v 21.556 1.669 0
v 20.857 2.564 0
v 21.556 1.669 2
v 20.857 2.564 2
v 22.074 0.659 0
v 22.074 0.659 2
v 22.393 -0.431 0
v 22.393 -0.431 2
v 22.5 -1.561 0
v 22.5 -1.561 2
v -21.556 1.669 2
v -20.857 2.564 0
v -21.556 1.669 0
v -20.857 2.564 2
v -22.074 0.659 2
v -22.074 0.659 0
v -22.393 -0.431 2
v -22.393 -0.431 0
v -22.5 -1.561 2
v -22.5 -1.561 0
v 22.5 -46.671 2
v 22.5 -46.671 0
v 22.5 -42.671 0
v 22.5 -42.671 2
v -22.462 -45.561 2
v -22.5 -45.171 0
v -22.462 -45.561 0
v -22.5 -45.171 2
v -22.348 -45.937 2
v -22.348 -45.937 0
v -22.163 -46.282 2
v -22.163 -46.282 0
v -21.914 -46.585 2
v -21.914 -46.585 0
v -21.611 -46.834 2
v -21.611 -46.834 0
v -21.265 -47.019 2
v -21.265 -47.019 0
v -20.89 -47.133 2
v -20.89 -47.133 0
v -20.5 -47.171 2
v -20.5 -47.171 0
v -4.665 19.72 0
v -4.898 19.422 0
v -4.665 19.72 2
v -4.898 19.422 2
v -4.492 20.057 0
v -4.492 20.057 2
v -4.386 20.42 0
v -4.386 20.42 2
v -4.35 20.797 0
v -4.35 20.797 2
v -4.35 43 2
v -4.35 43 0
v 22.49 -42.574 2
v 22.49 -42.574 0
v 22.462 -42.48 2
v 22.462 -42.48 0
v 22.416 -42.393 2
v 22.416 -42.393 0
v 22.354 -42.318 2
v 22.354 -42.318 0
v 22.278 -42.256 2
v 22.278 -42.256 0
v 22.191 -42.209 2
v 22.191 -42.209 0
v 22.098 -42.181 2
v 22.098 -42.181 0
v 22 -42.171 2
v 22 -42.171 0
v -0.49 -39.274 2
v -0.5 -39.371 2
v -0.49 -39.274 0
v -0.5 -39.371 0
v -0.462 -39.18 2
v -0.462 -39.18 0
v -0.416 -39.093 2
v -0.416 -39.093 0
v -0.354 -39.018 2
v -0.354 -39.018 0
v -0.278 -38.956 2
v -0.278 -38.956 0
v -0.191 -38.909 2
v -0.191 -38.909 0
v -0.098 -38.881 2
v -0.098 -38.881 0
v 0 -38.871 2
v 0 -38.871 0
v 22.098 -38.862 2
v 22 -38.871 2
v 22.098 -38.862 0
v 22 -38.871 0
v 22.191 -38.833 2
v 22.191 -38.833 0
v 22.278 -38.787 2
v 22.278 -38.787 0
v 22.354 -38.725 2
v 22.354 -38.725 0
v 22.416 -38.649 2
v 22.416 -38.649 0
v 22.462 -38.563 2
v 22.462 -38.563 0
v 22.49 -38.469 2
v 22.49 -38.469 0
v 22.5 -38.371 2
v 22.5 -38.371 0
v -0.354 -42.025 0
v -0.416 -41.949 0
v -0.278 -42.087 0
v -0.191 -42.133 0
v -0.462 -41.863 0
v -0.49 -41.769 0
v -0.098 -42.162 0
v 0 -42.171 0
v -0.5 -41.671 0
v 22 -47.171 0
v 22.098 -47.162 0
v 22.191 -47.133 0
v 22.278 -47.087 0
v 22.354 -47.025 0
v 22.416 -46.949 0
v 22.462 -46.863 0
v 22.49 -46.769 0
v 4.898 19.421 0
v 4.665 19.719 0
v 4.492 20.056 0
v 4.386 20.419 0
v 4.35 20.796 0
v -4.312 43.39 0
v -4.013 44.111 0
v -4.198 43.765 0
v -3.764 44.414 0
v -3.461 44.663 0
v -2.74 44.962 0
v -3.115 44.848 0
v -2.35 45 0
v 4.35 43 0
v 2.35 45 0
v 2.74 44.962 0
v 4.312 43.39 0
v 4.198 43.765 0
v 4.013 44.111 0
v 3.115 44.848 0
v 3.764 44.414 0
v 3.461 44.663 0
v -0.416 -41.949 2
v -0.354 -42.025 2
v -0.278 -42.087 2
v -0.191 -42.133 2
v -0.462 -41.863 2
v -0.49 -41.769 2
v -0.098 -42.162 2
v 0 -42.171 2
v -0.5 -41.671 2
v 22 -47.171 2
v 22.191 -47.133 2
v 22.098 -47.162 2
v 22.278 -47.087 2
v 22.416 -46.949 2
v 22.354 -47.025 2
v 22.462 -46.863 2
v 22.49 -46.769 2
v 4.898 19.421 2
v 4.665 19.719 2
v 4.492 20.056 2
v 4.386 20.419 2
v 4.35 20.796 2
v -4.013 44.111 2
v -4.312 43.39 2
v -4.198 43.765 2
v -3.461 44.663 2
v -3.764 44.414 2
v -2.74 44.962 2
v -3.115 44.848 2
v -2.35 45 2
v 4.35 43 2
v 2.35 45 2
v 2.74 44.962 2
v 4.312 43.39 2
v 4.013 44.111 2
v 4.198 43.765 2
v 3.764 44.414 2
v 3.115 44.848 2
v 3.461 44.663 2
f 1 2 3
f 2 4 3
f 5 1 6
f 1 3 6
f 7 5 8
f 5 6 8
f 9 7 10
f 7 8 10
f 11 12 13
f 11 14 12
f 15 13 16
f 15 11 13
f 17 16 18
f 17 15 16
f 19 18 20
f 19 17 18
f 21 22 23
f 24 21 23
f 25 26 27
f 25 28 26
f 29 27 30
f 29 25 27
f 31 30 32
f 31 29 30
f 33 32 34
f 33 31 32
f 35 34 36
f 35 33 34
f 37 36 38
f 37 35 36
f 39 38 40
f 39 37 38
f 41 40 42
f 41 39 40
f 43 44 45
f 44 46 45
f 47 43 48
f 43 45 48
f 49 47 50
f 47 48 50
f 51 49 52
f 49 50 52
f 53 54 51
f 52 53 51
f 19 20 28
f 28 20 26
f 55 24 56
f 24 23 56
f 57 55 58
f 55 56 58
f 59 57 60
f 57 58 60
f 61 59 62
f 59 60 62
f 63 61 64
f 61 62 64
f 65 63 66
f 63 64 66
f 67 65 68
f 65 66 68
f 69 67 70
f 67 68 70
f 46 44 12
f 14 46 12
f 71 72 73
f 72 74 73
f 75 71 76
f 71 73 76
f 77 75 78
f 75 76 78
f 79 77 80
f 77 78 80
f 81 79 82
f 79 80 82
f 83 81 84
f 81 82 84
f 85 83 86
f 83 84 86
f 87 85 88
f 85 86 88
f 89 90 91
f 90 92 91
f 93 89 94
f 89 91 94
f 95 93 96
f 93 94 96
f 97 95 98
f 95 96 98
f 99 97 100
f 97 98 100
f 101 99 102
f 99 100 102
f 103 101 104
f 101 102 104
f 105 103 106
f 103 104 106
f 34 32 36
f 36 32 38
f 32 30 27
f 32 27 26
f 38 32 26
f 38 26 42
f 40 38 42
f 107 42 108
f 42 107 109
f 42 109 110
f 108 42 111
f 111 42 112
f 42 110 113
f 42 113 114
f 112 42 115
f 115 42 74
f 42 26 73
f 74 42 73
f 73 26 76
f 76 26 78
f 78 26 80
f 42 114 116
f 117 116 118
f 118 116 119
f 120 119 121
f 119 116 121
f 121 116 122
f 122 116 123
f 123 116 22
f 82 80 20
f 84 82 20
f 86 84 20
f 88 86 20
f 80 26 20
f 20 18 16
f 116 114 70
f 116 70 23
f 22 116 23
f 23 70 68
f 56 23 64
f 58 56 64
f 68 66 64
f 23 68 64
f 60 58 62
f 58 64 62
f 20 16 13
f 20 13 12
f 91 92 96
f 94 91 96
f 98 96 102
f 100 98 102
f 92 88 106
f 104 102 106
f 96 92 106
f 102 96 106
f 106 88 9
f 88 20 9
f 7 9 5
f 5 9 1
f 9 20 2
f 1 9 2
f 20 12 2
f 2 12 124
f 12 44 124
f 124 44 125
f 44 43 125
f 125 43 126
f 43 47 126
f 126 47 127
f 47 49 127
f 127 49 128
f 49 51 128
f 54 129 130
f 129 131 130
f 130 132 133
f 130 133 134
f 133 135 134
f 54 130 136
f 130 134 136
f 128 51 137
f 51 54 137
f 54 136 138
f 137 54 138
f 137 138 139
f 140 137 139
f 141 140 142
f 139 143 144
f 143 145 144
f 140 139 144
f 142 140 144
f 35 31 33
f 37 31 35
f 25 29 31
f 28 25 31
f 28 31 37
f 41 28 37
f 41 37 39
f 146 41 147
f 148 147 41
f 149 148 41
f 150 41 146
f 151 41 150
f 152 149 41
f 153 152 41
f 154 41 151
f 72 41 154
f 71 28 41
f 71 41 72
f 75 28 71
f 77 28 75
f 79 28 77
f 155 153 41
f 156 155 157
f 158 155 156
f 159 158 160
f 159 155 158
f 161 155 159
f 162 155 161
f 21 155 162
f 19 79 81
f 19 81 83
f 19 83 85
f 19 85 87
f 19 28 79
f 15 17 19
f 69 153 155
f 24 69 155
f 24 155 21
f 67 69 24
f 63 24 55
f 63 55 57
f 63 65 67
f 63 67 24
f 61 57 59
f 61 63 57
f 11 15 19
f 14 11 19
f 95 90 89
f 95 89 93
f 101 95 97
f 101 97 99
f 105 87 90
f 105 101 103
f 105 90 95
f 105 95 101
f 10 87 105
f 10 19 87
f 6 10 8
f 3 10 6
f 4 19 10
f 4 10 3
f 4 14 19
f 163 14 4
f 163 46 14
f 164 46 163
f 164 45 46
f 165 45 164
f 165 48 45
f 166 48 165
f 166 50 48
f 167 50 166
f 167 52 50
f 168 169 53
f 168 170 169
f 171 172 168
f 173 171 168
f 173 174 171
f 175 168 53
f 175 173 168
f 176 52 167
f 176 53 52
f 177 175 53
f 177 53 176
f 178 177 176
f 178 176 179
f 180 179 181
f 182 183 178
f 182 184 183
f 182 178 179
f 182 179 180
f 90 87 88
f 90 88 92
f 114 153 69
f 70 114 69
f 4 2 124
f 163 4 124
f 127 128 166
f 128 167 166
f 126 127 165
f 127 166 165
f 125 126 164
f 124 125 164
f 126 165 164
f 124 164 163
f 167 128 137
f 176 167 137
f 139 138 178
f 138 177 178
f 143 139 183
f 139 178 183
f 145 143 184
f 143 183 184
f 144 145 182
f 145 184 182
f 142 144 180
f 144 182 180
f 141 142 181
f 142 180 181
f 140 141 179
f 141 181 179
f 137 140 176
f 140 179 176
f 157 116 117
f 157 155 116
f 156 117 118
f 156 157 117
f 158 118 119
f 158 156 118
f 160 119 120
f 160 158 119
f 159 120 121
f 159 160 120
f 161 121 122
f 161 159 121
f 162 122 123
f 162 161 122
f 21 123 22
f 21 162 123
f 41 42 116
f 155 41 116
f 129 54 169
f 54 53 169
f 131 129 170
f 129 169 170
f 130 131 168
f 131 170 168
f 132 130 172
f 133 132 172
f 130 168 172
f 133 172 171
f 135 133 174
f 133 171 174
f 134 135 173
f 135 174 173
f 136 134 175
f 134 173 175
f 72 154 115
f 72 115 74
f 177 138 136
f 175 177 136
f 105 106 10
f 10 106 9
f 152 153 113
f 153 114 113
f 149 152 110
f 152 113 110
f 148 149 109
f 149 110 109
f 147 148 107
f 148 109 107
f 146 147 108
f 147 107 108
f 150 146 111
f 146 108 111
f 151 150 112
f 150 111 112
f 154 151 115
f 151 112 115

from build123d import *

# Parameters (mm, degrees)
SALIENTE_EXTRUIR1_DEPTH = 2
CROQUIS3_W              = 23
CROQUIS3_H              = 3.3
CORTAR_EXTRUIR2_DEPTH   = 2
REDONDEO1_R             = 2
REDONDEO2_R             = 6
REDONDEO3_R             = 0.5


with BuildPart() as part:
    # Croquis1 → Saliente-Extruir1 (new body)
    with BuildSketch(Plane.XY):
        Polygon((-4.35, 20), (-22.5, 0.828732436), (-22.5, -47.171267564), (22.5, -47.171267564), (22.5, 0.828732436), (4.35, 19.999005159), (4.35, 45), (-4.35, 45), align=None)
    extrude(amount=SALIENTE_EXTRUIR1_DEPTH)

    # Croquis3 → Cortar-Extruir2 (cut)
    with BuildSketch(Plane.XY.offset(2)):
        with Locations((11, -40.521267564)):
            Rectangle(CROQUIS3_W, CROQUIS3_H)
    extrude(amount=-CORTAR_EXTRUIR2_DEPTH, mode=Mode.SUBTRACT)

    # Redondeo1
    redondeo1_edges = [part.edges().sort_by_distance(p)[0] for p in [
        (-4.35, 45, 1),
        (-4.35, 20, 1),
        (-22.5, -47.171267564, 1),
        (4.35, 19.999005159, 1),
        (4.35, 45, 1),
    ]]
    fillet(redondeo1_edges, radius=REDONDEO1_R)

    # Redondeo2
    redondeo2_edges = [part.edges().sort_by_distance(p)[0] for p in [
        (-22.5, 0.828732436, 1),
        (22.5, 0.828732436, 1),
    ]]
    fillet(redondeo2_edges, radius=REDONDEO2_R)

    # Redondeo3
    redondeo3_edges = [part.edges().sort_by_distance(p)[0] for p in [
        (22.5, -47.171267564, 1),
        (-0.5, -38.871267564, 1),
        (-0.5, -42.171267564, 1),
        (22.5, -42.171267564, 1),
        (22.5, -38.871267564, 1),
    ]]
    fillet(redondeo3_edges, radius=REDONDEO3_R)


solid = part.part
